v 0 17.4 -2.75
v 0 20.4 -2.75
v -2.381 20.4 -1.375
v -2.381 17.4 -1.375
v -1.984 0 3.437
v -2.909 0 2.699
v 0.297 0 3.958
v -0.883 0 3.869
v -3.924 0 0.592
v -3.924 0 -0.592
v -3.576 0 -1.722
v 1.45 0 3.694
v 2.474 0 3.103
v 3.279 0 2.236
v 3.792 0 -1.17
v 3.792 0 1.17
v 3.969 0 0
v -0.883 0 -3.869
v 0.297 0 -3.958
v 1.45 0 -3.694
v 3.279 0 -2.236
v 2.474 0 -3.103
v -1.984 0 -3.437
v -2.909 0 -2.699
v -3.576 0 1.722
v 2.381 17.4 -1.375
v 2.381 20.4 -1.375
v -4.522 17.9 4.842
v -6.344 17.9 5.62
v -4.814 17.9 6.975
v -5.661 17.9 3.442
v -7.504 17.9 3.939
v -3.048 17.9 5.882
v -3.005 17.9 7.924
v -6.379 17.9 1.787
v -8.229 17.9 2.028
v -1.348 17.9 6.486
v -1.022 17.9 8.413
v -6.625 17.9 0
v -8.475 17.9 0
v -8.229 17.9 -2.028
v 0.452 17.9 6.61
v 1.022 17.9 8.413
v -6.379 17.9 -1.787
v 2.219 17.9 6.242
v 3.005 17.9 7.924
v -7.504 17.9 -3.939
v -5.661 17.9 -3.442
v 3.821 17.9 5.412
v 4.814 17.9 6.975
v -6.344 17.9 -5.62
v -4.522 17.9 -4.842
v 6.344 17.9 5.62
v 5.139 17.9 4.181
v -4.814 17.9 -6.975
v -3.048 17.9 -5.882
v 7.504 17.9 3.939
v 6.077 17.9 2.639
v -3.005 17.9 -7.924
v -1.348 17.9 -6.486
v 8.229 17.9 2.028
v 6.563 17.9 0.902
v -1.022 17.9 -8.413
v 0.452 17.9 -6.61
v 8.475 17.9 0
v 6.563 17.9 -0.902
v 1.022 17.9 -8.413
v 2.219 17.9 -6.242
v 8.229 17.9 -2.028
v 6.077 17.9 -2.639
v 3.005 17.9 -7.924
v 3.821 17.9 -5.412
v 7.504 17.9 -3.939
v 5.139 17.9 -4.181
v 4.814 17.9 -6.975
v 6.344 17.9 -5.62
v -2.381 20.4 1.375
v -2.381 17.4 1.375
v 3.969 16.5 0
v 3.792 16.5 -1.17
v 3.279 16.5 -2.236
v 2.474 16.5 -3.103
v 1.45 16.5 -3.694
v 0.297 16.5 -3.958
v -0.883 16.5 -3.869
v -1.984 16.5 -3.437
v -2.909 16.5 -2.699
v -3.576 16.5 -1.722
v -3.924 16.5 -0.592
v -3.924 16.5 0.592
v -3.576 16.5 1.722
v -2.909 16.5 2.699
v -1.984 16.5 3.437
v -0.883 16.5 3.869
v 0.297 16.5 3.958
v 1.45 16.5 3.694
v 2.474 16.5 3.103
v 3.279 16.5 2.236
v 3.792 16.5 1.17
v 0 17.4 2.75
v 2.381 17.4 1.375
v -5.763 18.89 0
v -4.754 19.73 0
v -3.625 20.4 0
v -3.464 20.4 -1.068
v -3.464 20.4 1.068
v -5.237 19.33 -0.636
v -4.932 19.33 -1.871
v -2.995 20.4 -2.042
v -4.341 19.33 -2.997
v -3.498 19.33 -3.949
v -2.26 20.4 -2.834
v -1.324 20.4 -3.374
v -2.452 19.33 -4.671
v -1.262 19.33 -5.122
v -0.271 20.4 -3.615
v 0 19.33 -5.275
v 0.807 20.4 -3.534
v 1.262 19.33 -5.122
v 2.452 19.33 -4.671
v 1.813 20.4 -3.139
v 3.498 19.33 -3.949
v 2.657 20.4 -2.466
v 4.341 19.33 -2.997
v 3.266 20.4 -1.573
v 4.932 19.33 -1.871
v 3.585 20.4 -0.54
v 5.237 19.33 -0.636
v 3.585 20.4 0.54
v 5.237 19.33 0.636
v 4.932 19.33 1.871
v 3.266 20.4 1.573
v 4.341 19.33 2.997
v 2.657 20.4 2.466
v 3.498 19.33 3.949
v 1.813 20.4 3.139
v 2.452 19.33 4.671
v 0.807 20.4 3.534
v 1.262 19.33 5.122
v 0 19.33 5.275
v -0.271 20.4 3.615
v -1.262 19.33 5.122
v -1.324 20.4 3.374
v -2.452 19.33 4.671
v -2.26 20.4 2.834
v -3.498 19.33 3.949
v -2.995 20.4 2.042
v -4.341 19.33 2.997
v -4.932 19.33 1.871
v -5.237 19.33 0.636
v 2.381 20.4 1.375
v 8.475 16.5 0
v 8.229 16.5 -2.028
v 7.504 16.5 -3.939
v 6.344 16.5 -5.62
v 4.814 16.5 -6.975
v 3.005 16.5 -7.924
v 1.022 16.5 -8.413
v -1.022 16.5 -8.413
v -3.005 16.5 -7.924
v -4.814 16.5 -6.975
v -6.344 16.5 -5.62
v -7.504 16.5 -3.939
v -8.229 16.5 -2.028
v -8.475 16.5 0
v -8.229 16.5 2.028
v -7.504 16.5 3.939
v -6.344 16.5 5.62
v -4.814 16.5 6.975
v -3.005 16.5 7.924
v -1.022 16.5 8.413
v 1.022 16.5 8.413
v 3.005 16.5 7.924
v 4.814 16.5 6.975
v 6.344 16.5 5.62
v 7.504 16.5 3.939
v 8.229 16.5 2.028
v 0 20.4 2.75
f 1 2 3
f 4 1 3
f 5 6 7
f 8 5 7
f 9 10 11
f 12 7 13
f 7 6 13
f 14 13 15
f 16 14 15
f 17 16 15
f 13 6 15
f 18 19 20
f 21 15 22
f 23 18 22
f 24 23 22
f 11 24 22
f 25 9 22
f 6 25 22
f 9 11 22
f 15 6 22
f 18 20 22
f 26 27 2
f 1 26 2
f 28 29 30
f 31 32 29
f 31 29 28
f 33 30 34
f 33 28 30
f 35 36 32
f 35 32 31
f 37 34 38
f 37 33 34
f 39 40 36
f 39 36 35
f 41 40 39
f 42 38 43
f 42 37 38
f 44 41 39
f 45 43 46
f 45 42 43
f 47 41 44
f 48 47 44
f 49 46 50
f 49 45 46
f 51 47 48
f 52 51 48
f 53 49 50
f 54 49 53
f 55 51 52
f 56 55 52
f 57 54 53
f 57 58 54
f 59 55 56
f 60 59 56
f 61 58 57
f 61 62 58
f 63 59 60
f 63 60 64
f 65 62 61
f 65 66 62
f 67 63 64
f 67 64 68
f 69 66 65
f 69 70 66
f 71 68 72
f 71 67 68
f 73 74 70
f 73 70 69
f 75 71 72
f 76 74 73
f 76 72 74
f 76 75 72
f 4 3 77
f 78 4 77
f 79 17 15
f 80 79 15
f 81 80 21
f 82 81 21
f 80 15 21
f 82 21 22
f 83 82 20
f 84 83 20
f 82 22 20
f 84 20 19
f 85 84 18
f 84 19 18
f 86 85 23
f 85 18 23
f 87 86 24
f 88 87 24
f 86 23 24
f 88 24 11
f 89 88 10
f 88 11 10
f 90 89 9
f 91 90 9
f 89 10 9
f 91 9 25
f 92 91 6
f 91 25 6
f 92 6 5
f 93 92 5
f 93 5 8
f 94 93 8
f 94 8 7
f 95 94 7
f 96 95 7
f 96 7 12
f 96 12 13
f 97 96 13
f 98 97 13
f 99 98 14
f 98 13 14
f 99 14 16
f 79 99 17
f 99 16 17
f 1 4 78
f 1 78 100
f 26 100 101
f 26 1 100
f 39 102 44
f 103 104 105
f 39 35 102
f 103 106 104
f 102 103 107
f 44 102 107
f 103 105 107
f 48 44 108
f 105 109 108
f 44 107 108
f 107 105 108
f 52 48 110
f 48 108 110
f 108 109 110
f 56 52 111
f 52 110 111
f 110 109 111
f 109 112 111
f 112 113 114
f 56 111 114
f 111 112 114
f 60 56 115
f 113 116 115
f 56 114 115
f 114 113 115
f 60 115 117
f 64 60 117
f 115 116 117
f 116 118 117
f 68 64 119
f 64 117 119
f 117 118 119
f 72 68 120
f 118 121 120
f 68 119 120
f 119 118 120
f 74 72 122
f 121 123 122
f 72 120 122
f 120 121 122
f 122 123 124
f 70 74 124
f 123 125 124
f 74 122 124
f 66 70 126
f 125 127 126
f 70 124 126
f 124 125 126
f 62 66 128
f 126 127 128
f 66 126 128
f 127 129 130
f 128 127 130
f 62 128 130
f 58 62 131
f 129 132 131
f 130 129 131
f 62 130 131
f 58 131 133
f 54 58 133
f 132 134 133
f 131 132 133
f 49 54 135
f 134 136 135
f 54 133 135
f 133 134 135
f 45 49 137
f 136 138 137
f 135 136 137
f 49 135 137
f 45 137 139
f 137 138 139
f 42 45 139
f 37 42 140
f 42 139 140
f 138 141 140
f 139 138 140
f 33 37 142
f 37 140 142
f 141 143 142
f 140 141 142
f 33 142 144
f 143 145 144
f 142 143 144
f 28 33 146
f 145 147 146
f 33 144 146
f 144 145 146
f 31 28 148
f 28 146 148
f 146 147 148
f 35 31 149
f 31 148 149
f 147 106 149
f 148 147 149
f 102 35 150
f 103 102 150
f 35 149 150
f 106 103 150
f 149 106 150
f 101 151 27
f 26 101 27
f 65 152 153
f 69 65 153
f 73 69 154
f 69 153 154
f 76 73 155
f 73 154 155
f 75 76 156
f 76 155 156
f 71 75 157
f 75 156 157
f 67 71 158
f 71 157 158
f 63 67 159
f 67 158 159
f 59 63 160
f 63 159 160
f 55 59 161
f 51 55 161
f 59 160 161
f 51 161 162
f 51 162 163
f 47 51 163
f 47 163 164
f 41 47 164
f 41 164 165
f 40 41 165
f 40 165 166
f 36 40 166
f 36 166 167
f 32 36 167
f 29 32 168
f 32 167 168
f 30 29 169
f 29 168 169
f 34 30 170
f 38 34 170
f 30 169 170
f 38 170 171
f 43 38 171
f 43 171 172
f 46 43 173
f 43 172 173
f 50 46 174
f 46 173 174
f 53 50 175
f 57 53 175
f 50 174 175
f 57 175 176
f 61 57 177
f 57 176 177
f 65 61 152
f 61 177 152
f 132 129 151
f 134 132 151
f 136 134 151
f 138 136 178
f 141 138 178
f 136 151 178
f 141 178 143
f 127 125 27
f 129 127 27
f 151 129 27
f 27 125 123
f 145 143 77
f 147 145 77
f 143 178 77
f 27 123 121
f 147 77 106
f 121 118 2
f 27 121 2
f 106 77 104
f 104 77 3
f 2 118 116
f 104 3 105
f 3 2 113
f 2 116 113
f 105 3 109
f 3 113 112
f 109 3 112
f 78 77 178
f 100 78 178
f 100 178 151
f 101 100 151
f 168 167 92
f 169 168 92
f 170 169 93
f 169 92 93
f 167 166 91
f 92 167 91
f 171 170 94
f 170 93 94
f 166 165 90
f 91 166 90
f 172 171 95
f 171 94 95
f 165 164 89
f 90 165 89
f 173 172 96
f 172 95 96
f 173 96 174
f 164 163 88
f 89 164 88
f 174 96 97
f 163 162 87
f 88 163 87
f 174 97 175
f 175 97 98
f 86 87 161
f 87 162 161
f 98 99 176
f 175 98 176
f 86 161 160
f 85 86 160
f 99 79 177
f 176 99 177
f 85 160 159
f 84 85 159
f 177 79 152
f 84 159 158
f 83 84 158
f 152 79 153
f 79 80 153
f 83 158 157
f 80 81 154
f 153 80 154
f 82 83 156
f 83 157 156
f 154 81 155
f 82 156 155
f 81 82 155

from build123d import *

# Parameters (mm, degrees)
SKETCH1_R           = 3.96875
BOSS_EXTRUDE1_DEPTH = 16.5
SKETCH2_R           = 8.475
BOSS_EXTRUDE2_DEPTH = 1.4
CUT_EXTRUDE1_DEPTH  = 3


with BuildPart() as part:
    # Sketch1 → Boss-Extrude1 (new body)
    with BuildSketch(Plane(origin=(0, 0, 0), x_dir=(1, 0, 0), z_dir=(0, 1, 0))):
        Circle(SKETCH1_R)
    extrude(amount=BOSS_EXTRUDE1_DEPTH)

    # Sketch2 → Boss-Extrude2 (add)
    with BuildSketch(Plane(origin=(0, 16.5, 0), x_dir=(1, 0, 0), z_dir=(0, 1, 0))):
        Circle(SKETCH2_R)
    extrude(amount=BOSS_EXTRUDE2_DEPTH)

    # Sketch3 → Revolve2 (revolve)
    with BuildSketch(Plane.XY):
        with BuildLine():
            Line((-3.625, 20.4), (0, 20.4))
            Line((0, 20.4), (0, 17.9))
            Line((0, 17.9), (-6.625, 17.9))
            ThreePointArc((-6.625, 17.9), (-5.275236962, 19.330284354), (-3.625, 20.4))
        make_face()
    revolve(axis=Axis((0, 20.4, 0), (0, -1, 0)))

    # Sketch4 → Cut-Extrude1 (cut)
    with BuildSketch(Plane(origin=(0, 20.4, 0), x_dir=(1, 0, 0), z_dir=(0, 1, 0))):
        Polygon((-2.38125, 1.374815329), (-2.38125, -1.374815329), (0, -2.749630657), (2.38125, -1.374815329), (2.38125, 1.374815329), (0, 2.749630657), align=None)
    extrude(amount=-CUT_EXTRUDE1_DEPTH, mode=Mode.SUBTRACT)


solid = part.part
